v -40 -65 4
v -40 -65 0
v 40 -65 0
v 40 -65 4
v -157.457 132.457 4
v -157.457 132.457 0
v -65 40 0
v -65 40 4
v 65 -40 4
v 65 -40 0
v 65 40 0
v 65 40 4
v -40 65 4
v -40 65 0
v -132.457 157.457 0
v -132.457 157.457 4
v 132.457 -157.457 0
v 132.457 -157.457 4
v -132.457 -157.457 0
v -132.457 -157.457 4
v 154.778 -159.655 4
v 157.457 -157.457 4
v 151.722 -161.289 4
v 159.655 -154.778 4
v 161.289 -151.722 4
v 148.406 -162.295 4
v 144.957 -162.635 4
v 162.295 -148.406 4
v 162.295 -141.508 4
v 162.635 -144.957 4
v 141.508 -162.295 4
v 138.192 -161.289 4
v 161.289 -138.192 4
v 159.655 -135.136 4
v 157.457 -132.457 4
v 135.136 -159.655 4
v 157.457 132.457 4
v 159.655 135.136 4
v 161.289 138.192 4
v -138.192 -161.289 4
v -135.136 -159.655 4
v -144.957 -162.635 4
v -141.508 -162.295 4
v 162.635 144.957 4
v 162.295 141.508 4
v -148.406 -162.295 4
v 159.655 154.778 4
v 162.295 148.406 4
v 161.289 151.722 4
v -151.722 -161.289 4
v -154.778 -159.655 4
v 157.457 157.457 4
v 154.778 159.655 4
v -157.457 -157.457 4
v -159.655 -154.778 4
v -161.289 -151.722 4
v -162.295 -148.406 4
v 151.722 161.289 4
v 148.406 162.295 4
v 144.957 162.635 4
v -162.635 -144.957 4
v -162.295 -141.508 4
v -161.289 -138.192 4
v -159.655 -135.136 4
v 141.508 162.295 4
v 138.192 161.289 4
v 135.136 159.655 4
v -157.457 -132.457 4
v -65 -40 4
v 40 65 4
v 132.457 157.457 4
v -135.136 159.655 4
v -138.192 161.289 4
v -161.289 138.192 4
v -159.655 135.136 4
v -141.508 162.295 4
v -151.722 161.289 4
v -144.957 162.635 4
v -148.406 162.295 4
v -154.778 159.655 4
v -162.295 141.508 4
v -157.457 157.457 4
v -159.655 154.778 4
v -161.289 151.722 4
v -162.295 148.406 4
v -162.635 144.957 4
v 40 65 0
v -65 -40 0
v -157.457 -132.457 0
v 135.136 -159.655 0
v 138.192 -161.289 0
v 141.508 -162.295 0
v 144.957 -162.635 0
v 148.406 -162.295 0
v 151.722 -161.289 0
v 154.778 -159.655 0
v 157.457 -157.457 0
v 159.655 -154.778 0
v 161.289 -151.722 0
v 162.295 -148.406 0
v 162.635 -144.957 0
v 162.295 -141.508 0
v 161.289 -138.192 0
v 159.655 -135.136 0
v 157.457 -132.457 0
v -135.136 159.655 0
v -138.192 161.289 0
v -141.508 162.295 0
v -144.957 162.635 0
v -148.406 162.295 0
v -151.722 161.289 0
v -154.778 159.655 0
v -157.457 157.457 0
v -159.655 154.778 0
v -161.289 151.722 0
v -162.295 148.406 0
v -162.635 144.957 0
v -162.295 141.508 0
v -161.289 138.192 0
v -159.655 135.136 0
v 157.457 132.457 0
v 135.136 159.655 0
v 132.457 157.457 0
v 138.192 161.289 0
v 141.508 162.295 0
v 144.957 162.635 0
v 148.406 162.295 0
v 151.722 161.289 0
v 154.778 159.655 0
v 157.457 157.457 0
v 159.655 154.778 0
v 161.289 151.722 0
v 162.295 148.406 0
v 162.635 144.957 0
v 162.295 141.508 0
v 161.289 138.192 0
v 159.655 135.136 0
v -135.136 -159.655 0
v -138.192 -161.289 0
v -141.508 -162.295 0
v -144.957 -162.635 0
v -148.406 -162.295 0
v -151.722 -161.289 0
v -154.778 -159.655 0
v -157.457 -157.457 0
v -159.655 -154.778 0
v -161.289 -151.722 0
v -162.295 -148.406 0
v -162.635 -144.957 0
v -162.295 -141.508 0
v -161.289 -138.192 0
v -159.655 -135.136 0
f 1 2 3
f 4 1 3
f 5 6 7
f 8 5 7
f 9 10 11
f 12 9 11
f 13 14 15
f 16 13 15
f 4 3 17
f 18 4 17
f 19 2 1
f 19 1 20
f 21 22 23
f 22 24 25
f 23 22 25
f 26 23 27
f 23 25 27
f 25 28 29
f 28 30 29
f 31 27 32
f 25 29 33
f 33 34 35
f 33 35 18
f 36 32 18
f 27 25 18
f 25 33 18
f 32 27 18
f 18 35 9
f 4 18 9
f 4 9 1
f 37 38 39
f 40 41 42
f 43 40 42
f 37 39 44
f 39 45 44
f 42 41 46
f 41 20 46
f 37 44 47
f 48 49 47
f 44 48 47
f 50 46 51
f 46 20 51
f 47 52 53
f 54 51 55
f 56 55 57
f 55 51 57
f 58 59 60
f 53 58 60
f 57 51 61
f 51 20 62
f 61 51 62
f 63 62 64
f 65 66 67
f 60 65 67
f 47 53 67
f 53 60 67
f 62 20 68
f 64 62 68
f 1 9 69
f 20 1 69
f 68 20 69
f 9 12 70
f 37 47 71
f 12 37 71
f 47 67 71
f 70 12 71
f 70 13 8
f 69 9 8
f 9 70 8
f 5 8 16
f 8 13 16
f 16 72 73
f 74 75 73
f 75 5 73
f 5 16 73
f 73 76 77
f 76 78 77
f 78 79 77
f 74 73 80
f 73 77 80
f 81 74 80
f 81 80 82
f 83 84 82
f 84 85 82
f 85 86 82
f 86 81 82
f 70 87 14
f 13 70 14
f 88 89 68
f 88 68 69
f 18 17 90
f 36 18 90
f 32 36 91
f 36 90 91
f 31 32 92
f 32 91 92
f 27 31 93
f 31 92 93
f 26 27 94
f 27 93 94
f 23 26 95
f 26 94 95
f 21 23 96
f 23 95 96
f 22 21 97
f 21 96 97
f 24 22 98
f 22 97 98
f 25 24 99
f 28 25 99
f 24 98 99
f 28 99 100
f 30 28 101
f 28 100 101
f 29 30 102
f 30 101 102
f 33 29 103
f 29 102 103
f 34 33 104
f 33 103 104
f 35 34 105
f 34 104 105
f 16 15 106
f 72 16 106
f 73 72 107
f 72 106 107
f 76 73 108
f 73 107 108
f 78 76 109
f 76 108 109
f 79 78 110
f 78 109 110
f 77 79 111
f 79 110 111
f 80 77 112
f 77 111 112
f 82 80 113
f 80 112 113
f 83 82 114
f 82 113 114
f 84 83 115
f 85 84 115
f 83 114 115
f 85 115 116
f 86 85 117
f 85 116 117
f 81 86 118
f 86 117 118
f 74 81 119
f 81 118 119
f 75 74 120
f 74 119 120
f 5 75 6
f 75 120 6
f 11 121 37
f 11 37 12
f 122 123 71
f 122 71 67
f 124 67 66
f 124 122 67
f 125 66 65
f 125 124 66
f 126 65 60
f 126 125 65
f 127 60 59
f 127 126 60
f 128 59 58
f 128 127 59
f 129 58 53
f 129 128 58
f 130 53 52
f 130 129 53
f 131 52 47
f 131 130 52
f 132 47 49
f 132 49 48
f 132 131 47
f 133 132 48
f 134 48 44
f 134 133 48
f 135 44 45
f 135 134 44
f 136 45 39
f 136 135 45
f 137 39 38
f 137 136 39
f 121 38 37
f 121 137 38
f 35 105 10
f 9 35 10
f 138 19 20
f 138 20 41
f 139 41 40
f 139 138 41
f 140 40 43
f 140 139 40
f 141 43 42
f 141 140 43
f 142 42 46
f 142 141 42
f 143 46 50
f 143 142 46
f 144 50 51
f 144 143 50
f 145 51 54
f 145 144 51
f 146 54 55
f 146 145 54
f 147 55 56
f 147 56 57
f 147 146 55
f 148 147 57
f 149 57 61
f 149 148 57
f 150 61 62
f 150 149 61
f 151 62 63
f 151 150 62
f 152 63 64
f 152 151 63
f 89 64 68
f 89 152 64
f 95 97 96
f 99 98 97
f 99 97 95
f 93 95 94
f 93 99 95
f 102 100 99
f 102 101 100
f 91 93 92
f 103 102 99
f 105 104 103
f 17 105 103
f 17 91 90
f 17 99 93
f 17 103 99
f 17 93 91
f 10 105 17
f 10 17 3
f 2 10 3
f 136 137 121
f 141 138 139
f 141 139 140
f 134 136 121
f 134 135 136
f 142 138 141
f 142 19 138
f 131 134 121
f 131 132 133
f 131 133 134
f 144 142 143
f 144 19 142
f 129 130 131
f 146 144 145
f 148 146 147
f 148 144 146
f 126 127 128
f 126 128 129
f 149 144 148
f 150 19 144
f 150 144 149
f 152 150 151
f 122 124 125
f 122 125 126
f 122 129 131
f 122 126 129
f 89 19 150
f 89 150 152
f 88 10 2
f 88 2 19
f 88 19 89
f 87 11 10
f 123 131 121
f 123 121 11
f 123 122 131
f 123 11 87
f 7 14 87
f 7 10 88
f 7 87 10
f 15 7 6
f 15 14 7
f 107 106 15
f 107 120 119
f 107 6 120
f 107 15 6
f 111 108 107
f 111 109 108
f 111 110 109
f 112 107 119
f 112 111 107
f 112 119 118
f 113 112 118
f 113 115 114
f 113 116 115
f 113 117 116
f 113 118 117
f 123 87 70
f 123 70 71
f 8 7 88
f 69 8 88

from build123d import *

# Parameters (mm, degrees)
EXTRUDE_1_DEPTH = 4


with BuildPart() as part:
    # 草图1 → 凸台-拉伸1 (new body)
    with BuildSketch(Plane.XY):
        with BuildLine():
            ThreePointArc((-132.456890143, -157.456890143), (-157.456890143, -157.456890143), (-157.456890143, -132.456890143))
            Line((-157.456890143, -132.456890143), (-65, -40))
            Line((-65, -40), (-40, -65))
            Line((-40, -65), (-132.456890143, -157.456890143))
        make_face()
        with BuildLine():
            Line((-40, 65), (-132.456890143, 157.456890143))
            ThreePointArc((-132.456890143, 157.456890143), (-157.456890143, 157.456890143), (-157.456890143, 132.456890143))
            Line((-157.456890143, 132.456890143), (-65, 40))
            Line((-65, 40), (-40, 65))
        make_face()
        Polygon((-65, 40), (-65, -40), (-40, -65), (40, -65), (65, -40), (65, 40), (40, 65), (-40, 65), align=None)
        with BuildLine():
            Line((40, -65), (132.456890143, -157.456890143))
            ThreePointArc((132.456890143, -157.456890143), (157.456890143, -157.456890143), (157.456890143, -132.456890143))
            Line((157.456890143, -132.456890143), (65, -40))
            Line((65, -40), (40, -65))
        make_face()
        with BuildLine():
            ThreePointArc((132.456890143, 157.456890143), (157.456890143, 157.456890143), (157.456890143, 132.456890143))
            Line((157.456890143, 132.456890143), (65, 40))
            Line((65, 40), (40, 65))
            Line((40, 65), (132.456890143, 157.456890143))
        make_face()
    extrude(amount=EXTRUDE_1_DEPTH)


solid = part.part
